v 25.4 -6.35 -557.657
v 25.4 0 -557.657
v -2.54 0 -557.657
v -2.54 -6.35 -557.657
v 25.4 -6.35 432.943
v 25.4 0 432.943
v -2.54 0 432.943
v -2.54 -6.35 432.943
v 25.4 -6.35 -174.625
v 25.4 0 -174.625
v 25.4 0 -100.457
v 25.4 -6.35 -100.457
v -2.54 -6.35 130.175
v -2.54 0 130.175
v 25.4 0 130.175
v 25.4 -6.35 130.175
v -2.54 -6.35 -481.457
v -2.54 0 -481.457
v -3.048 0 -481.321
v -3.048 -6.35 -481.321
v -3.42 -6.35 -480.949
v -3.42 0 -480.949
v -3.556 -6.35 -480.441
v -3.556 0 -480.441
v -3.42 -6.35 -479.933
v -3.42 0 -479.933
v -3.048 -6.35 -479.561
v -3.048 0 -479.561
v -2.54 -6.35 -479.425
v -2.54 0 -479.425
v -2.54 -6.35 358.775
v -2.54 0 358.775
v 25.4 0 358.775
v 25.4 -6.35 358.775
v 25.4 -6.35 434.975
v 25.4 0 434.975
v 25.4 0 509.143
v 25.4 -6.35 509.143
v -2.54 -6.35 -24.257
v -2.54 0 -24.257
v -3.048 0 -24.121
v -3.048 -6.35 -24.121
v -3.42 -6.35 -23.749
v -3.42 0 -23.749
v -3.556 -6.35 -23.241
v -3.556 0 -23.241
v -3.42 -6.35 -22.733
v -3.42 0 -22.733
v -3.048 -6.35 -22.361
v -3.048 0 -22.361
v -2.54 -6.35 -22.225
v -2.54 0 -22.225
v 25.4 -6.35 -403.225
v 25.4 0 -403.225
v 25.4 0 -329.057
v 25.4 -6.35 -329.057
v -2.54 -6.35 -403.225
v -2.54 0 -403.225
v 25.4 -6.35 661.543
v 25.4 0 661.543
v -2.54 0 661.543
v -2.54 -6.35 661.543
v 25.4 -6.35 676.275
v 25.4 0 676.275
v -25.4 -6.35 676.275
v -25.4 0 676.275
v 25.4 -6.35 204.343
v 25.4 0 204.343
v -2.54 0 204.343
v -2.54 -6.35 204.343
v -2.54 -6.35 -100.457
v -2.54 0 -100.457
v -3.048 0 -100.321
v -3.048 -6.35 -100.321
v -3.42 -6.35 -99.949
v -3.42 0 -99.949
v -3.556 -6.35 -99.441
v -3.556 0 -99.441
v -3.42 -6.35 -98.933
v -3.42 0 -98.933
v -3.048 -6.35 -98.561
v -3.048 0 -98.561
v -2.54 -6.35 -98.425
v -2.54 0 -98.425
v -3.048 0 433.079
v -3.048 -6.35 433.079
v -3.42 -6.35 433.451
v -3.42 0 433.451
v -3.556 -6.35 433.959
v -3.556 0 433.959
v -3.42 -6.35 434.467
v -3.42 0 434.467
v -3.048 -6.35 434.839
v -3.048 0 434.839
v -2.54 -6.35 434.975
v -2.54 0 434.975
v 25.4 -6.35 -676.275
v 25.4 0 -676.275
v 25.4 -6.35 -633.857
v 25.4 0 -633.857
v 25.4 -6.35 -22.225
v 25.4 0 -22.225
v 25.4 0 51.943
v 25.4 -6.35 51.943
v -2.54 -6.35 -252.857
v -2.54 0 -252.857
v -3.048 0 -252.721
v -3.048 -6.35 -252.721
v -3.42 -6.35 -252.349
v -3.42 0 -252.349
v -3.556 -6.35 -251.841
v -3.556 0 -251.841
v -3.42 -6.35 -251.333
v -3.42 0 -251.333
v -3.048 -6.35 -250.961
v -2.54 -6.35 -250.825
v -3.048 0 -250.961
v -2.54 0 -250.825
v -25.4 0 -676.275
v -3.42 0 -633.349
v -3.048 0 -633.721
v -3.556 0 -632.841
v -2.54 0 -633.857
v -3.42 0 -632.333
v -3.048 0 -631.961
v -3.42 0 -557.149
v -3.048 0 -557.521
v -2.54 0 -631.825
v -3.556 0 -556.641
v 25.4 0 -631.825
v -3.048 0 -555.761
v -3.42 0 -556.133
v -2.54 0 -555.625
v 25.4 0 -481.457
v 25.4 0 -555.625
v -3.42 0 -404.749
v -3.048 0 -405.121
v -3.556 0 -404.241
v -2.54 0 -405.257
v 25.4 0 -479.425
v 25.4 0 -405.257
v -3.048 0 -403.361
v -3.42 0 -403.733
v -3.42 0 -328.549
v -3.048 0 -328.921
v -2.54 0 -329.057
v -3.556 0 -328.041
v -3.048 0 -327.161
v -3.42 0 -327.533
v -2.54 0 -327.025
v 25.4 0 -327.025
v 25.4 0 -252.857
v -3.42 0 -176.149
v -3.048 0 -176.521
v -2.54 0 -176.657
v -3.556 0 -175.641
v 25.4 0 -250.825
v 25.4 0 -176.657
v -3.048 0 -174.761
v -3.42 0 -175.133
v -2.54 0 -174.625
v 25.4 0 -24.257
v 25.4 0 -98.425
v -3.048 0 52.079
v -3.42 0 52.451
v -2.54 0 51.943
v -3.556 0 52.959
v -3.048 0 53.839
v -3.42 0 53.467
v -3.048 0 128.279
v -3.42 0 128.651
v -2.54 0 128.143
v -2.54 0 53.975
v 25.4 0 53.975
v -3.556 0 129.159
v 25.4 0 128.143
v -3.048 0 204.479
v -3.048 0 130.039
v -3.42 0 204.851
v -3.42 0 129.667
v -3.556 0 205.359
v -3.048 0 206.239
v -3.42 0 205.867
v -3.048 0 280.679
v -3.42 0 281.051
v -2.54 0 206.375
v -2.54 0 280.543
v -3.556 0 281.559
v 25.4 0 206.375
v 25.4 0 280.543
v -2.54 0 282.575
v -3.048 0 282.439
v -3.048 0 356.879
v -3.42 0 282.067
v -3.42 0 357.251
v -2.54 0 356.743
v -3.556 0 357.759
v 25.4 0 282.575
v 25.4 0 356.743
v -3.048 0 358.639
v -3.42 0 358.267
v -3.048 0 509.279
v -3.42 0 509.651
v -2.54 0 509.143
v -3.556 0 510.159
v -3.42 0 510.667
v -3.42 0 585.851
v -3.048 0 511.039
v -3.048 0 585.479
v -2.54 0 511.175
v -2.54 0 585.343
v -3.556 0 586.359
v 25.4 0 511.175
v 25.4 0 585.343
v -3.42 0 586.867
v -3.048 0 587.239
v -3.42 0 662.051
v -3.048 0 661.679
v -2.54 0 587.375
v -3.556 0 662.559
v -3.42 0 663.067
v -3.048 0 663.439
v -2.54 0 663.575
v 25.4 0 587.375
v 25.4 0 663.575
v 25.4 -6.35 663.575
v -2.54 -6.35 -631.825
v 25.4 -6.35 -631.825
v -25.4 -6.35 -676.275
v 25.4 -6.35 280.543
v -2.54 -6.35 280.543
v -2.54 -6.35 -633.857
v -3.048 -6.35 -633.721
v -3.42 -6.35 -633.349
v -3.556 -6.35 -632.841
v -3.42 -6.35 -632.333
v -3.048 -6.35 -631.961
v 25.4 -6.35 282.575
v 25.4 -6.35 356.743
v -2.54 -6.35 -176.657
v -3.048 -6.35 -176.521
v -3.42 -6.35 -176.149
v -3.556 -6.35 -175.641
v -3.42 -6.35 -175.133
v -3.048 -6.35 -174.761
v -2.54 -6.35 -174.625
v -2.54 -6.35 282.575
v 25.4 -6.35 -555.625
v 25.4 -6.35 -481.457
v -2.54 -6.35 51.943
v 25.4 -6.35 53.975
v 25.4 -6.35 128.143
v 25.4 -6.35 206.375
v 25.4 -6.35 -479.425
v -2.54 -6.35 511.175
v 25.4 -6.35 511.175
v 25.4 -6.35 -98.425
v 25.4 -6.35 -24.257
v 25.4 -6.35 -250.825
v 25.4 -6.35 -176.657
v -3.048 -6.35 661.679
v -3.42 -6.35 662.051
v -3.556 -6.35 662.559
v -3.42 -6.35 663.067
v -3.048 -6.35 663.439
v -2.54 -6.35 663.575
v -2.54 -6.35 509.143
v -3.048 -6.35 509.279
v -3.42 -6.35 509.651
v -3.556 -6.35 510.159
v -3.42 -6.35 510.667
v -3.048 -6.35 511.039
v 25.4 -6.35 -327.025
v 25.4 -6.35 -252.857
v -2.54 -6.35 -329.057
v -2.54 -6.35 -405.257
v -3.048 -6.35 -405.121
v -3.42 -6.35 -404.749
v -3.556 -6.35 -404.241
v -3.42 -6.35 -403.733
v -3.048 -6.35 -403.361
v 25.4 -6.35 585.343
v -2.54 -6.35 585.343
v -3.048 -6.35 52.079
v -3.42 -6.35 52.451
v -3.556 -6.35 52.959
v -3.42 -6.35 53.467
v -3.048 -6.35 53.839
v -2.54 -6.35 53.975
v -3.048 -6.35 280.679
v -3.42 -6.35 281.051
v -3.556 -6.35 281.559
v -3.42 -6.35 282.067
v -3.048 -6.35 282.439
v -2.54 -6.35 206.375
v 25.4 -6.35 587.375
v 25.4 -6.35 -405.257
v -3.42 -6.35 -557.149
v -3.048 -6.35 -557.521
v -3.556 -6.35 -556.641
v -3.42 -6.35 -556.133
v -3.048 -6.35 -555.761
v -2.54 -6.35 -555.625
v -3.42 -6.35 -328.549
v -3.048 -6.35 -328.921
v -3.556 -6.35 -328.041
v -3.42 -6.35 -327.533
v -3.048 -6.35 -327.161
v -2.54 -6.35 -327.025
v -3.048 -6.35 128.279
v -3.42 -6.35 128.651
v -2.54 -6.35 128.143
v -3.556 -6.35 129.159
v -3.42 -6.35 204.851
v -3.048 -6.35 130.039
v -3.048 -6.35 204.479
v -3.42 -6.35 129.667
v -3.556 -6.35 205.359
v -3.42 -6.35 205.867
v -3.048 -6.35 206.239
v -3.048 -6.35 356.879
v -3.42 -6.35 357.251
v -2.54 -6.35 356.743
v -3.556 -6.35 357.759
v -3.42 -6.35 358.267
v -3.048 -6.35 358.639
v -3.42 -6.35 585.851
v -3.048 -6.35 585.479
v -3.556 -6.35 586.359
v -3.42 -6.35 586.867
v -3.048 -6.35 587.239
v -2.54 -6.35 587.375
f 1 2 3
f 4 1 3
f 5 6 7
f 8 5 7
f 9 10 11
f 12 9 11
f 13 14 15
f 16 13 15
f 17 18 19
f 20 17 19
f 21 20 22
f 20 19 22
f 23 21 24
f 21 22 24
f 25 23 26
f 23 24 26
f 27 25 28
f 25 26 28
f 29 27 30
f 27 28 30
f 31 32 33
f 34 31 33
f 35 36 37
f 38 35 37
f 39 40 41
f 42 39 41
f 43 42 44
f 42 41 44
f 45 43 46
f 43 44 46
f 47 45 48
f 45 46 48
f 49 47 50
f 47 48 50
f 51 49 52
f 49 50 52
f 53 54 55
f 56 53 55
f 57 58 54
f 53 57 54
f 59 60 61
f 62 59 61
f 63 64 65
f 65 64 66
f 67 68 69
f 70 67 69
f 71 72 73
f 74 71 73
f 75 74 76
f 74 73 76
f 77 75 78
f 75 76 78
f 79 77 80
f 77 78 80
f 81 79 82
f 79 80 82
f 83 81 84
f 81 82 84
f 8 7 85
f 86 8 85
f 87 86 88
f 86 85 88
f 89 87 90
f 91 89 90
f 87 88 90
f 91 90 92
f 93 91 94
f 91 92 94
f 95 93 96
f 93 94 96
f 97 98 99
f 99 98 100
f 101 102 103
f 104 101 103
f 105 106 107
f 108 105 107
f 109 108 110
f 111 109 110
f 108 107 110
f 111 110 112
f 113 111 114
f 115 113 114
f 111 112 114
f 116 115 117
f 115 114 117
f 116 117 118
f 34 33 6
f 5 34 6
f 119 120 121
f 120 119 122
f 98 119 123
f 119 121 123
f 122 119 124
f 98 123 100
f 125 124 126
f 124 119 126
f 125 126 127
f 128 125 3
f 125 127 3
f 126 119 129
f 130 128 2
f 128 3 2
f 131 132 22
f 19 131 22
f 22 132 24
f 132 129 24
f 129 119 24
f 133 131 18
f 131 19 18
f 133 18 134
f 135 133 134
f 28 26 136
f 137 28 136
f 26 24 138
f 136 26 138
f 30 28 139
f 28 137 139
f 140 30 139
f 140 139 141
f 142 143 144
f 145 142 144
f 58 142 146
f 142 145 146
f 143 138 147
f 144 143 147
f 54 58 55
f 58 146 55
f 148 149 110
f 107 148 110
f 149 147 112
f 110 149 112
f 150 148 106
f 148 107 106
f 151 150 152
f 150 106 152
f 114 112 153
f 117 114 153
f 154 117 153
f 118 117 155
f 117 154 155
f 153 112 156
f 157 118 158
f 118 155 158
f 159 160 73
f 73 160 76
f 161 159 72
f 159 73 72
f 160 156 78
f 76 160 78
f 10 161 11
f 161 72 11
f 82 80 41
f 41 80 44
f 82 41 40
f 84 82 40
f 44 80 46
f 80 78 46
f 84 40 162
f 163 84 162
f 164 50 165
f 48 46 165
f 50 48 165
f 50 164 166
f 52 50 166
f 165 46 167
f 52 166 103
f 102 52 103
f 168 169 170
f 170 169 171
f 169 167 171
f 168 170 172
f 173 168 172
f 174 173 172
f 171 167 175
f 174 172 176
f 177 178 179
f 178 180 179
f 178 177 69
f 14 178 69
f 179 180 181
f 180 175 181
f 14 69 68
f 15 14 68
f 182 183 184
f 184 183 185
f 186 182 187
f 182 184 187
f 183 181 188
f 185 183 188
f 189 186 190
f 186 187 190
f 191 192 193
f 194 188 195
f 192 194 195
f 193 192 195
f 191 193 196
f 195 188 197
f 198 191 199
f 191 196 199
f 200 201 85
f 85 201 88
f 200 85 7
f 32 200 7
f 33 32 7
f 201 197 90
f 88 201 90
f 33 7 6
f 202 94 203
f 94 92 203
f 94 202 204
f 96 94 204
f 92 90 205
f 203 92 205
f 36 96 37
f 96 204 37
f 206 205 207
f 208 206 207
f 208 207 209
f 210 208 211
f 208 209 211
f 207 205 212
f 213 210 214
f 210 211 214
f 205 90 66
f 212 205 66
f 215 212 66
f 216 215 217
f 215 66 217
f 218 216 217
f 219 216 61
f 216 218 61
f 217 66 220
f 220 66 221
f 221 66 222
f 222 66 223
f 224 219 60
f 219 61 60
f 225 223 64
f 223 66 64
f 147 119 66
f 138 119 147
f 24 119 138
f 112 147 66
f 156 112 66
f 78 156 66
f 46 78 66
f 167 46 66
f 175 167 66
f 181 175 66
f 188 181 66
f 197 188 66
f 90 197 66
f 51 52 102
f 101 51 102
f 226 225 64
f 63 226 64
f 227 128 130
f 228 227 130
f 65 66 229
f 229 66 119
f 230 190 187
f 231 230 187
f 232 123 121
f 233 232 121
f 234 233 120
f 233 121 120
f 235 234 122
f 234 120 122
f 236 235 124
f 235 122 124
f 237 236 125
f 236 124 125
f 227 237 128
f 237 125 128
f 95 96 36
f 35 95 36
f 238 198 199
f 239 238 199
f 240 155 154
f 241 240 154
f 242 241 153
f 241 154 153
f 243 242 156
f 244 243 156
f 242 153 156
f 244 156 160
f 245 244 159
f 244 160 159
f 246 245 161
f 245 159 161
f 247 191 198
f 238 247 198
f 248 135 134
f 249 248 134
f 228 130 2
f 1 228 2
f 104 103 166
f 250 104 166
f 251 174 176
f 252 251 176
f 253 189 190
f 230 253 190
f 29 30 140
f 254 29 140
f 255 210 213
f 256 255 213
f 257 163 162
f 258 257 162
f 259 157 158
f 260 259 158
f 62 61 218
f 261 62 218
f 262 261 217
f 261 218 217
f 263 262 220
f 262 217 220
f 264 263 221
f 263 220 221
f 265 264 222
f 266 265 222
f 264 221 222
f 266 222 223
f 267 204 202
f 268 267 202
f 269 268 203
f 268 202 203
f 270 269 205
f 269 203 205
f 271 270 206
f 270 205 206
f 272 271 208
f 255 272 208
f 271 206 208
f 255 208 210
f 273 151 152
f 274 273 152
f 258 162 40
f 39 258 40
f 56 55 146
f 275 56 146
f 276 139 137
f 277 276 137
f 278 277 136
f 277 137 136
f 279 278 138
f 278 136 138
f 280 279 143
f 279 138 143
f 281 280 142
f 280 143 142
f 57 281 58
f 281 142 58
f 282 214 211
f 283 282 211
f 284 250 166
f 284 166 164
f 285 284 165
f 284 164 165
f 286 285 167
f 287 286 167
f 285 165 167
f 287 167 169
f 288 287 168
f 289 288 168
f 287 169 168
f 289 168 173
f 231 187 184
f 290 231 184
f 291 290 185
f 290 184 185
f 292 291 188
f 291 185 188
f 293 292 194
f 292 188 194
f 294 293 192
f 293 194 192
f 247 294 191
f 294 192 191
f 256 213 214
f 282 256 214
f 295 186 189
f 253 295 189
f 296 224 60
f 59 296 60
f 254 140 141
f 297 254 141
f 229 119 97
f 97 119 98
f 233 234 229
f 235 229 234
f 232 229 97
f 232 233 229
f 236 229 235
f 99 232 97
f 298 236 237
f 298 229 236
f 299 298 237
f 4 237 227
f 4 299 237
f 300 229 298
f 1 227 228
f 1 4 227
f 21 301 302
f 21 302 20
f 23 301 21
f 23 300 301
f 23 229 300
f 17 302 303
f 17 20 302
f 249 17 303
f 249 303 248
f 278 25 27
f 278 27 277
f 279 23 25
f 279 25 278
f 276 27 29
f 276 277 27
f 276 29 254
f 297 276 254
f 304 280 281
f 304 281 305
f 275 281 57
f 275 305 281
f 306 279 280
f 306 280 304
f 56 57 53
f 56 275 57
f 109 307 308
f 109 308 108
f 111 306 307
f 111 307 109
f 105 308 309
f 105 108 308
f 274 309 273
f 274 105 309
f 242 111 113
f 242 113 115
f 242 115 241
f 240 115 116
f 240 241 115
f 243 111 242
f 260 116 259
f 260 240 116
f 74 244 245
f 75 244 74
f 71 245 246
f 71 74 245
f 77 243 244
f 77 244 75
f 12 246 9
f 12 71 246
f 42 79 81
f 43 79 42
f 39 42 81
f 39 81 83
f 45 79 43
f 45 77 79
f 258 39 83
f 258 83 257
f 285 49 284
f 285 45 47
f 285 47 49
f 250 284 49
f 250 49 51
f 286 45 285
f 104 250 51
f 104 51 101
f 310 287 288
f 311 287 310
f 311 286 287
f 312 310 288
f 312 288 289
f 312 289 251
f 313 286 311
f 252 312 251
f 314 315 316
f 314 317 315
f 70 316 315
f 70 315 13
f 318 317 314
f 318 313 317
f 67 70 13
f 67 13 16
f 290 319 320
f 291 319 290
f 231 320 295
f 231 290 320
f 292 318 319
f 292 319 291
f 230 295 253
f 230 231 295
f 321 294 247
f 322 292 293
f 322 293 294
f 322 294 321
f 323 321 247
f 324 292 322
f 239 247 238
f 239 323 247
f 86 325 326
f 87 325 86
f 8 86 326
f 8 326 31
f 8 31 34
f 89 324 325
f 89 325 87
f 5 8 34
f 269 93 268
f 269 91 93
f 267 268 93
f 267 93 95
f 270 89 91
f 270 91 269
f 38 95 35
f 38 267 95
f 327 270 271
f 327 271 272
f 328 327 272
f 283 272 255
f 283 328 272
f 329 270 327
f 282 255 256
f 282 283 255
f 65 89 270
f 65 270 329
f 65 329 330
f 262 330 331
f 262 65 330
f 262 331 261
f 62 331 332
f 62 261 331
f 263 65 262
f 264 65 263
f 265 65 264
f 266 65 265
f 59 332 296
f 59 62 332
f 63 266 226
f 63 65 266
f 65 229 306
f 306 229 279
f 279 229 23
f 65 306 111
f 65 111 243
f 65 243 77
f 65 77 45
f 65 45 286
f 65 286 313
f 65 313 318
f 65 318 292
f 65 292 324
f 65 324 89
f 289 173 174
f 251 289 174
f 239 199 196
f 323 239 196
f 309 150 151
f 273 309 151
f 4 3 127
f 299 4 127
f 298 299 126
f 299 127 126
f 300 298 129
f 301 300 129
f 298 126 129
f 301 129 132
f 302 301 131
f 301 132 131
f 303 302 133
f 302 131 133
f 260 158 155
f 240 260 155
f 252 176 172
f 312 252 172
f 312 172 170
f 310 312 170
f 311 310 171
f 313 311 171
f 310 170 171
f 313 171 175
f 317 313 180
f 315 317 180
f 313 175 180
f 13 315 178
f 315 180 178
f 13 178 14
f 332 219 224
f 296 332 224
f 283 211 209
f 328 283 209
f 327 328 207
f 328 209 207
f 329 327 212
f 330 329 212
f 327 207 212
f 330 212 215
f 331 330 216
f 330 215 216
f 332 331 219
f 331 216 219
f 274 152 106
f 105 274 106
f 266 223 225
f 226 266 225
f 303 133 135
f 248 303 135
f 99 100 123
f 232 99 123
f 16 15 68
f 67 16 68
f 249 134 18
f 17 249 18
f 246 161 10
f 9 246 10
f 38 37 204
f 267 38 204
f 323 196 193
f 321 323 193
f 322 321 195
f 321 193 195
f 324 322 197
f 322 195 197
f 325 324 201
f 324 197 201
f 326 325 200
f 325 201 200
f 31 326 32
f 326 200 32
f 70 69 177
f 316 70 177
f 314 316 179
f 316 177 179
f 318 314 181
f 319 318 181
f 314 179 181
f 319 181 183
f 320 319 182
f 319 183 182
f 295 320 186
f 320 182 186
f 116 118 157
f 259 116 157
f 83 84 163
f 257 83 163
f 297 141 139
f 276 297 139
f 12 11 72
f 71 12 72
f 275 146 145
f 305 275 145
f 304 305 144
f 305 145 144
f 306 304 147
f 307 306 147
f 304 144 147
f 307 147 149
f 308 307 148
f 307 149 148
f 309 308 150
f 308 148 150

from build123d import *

# Parameters (mm, degrees)
F1_DEPTH = 6.35


with BuildPart() as f1:
    # F0 (on Front) → F1 (new body)
    with BuildSketch(Plane.XZ):
        with BuildLine():
            Line((-25.4, -676.275), (25.4, -676.275))
            Line((25.4, -676.275), (25.4, -633.857))
            Line((25.4, -633.857), (-2.54, -633.857))
            ThreePointArc((-2.54, -633.857), (-3.556, -632.841), (-2.54, -631.825))
            Line((-2.54, -631.825), (25.4, -631.825))
            Line((25.4, -631.825), (25.4, -557.657))
            Line((25.4, -557.657), (-2.54, -557.657))
            ThreePointArc((-2.54, -557.657), (-3.556, -556.641), (-2.54, -555.625))
            Line((-2.54, -555.625), (25.4, -555.625))
            Line((25.4, -555.625), (25.4, -481.457))
            Line((25.4, -481.457), (-2.54, -481.457))
            ThreePointArc((-2.54, -481.457), (-3.556, -480.441), (-2.54, -479.425))
            Line((-2.54, -479.425), (25.4, -479.425))
            Line((25.4, -479.425), (25.4, -405.257))
            Line((25.4, -405.257), (-2.54, -405.257))
            ThreePointArc((-2.54, -405.257), (-3.556, -404.241), (-2.54, -403.225))
            Line((-2.54, -403.225), (25.4, -403.225))
            Line((25.4, -403.225), (25.4, -329.057))
            Line((25.4, -329.057), (-2.54, -329.057))
            ThreePointArc((-2.54, -329.057), (-3.556, -328.041), (-2.54, -327.025))
            Line((-2.54, -327.025), (25.4, -327.025))
            Line((25.4, -327.025), (25.4, -252.857))
            Line((25.4, -252.857), (-2.54, -252.857))
            ThreePointArc((-2.54, -252.857), (-3.556, -251.841), (-2.54, -250.825))
            Line((-2.54, -250.825), (25.4, -250.825))
            Line((25.4, -250.825), (25.4, -176.657))
            Line((25.4, -176.657), (-2.54, -176.657))
            ThreePointArc((-2.54, -176.657), (-3.556, -175.641), (-2.54, -174.625))
            Line((-2.54, -174.625), (25.4, -174.625))
            Line((25.4, -174.625), (25.4, -100.457))
            Line((25.4, -100.457), (-2.54, -100.457))
            ThreePointArc((-2.54, -100.457), (-3.556, -99.441), (-2.54, -98.425))
            Line((-2.54, -98.425), (25.4, -98.425))
            Line((25.4, -98.425), (25.4, -24.257))
            Line((25.4, -24.257), (-2.54, -24.257))
            ThreePointArc((-2.54, -24.257), (-3.556, -23.241), (-2.54, -22.225))
            Line((-2.54, -22.225), (25.4, -22.225))
            Line((25.4, -22.225), (25.4, 51.943))
            Line((25.4, 51.943), (-2.54, 51.943))
            ThreePointArc((-2.54, 51.943), (-3.556, 52.959), (-2.54, 53.975))
            Line((-2.54, 53.975), (25.4, 53.975))
            Line((25.4, 53.975), (25.4, 128.143))
            Line((25.4, 128.143), (-2.54, 128.143))
            ThreePointArc((-2.54, 128.143), (-3.556, 129.159), (-2.54, 130.175))
            Line((-2.54, 130.175), (25.4, 130.175))
            Line((25.4, 130.175), (25.4, 204.343))
            Line((25.4, 204.343), (-2.54, 204.343))
            ThreePointArc((-2.54, 204.343), (-3.556, 205.359), (-2.54, 206.375))
            Line((-2.54, 206.375), (25.4, 206.375))
            Line((25.4, 206.375), (25.4, 280.543))
            Line((25.4, 280.543), (-2.54, 280.543))
            ThreePointArc((-2.54, 280.543), (-3.556, 281.559), (-2.54, 282.575))
            Line((-2.54, 282.575), (25.4, 282.575))
            Line((25.4, 282.575), (25.4, 356.743))
            Line((25.4, 356.743), (-2.54, 356.743))
            ThreePointArc((-2.54, 356.743), (-3.556, 357.759), (-2.54, 358.775))
            Line((-2.54, 358.775), (25.4, 358.775))
            Line((25.4, 358.775), (25.4, 432.943))
            Line((25.4, 432.943), (-2.54, 432.943))
            ThreePointArc((-2.54, 432.943), (-3.556, 433.959), (-2.54, 434.975))
            Line((-2.54, 434.975), (25.4, 434.975))
            Line((25.4, 434.975), (25.4, 509.143))
            Line((25.4, 509.143), (-2.54, 509.143))
            ThreePointArc((-2.54, 509.143), (-3.556, 510.159), (-2.54, 511.175))
            Line((-2.54, 511.175), (25.4, 511.175))
            Line((25.4, 511.175), (25.4, 585.343))
            Line((25.4, 585.343), (-2.54, 585.343))
            ThreePointArc((-2.54, 585.343), (-3.556, 586.359), (-2.54, 587.375))
            Line((-2.54, 587.375), (25.4, 587.375))
            Line((25.4, 587.375), (25.4, 661.543))
            Line((25.4, 661.543), (-2.54, 661.543))
            ThreePointArc((-2.54, 661.543), (-3.556, 662.559), (-2.54, 663.575))
            Line((-2.54, 663.575), (25.4, 663.575))
            Line((25.4, 663.575), (25.4, 676.275))
            Line((25.4, 676.275), (-25.4, 676.275))
            Line((-25.4, 676.275), (-25.4, -676.275))
        make_face()
    extrude(amount=F1_DEPTH)


solid = f1.part
